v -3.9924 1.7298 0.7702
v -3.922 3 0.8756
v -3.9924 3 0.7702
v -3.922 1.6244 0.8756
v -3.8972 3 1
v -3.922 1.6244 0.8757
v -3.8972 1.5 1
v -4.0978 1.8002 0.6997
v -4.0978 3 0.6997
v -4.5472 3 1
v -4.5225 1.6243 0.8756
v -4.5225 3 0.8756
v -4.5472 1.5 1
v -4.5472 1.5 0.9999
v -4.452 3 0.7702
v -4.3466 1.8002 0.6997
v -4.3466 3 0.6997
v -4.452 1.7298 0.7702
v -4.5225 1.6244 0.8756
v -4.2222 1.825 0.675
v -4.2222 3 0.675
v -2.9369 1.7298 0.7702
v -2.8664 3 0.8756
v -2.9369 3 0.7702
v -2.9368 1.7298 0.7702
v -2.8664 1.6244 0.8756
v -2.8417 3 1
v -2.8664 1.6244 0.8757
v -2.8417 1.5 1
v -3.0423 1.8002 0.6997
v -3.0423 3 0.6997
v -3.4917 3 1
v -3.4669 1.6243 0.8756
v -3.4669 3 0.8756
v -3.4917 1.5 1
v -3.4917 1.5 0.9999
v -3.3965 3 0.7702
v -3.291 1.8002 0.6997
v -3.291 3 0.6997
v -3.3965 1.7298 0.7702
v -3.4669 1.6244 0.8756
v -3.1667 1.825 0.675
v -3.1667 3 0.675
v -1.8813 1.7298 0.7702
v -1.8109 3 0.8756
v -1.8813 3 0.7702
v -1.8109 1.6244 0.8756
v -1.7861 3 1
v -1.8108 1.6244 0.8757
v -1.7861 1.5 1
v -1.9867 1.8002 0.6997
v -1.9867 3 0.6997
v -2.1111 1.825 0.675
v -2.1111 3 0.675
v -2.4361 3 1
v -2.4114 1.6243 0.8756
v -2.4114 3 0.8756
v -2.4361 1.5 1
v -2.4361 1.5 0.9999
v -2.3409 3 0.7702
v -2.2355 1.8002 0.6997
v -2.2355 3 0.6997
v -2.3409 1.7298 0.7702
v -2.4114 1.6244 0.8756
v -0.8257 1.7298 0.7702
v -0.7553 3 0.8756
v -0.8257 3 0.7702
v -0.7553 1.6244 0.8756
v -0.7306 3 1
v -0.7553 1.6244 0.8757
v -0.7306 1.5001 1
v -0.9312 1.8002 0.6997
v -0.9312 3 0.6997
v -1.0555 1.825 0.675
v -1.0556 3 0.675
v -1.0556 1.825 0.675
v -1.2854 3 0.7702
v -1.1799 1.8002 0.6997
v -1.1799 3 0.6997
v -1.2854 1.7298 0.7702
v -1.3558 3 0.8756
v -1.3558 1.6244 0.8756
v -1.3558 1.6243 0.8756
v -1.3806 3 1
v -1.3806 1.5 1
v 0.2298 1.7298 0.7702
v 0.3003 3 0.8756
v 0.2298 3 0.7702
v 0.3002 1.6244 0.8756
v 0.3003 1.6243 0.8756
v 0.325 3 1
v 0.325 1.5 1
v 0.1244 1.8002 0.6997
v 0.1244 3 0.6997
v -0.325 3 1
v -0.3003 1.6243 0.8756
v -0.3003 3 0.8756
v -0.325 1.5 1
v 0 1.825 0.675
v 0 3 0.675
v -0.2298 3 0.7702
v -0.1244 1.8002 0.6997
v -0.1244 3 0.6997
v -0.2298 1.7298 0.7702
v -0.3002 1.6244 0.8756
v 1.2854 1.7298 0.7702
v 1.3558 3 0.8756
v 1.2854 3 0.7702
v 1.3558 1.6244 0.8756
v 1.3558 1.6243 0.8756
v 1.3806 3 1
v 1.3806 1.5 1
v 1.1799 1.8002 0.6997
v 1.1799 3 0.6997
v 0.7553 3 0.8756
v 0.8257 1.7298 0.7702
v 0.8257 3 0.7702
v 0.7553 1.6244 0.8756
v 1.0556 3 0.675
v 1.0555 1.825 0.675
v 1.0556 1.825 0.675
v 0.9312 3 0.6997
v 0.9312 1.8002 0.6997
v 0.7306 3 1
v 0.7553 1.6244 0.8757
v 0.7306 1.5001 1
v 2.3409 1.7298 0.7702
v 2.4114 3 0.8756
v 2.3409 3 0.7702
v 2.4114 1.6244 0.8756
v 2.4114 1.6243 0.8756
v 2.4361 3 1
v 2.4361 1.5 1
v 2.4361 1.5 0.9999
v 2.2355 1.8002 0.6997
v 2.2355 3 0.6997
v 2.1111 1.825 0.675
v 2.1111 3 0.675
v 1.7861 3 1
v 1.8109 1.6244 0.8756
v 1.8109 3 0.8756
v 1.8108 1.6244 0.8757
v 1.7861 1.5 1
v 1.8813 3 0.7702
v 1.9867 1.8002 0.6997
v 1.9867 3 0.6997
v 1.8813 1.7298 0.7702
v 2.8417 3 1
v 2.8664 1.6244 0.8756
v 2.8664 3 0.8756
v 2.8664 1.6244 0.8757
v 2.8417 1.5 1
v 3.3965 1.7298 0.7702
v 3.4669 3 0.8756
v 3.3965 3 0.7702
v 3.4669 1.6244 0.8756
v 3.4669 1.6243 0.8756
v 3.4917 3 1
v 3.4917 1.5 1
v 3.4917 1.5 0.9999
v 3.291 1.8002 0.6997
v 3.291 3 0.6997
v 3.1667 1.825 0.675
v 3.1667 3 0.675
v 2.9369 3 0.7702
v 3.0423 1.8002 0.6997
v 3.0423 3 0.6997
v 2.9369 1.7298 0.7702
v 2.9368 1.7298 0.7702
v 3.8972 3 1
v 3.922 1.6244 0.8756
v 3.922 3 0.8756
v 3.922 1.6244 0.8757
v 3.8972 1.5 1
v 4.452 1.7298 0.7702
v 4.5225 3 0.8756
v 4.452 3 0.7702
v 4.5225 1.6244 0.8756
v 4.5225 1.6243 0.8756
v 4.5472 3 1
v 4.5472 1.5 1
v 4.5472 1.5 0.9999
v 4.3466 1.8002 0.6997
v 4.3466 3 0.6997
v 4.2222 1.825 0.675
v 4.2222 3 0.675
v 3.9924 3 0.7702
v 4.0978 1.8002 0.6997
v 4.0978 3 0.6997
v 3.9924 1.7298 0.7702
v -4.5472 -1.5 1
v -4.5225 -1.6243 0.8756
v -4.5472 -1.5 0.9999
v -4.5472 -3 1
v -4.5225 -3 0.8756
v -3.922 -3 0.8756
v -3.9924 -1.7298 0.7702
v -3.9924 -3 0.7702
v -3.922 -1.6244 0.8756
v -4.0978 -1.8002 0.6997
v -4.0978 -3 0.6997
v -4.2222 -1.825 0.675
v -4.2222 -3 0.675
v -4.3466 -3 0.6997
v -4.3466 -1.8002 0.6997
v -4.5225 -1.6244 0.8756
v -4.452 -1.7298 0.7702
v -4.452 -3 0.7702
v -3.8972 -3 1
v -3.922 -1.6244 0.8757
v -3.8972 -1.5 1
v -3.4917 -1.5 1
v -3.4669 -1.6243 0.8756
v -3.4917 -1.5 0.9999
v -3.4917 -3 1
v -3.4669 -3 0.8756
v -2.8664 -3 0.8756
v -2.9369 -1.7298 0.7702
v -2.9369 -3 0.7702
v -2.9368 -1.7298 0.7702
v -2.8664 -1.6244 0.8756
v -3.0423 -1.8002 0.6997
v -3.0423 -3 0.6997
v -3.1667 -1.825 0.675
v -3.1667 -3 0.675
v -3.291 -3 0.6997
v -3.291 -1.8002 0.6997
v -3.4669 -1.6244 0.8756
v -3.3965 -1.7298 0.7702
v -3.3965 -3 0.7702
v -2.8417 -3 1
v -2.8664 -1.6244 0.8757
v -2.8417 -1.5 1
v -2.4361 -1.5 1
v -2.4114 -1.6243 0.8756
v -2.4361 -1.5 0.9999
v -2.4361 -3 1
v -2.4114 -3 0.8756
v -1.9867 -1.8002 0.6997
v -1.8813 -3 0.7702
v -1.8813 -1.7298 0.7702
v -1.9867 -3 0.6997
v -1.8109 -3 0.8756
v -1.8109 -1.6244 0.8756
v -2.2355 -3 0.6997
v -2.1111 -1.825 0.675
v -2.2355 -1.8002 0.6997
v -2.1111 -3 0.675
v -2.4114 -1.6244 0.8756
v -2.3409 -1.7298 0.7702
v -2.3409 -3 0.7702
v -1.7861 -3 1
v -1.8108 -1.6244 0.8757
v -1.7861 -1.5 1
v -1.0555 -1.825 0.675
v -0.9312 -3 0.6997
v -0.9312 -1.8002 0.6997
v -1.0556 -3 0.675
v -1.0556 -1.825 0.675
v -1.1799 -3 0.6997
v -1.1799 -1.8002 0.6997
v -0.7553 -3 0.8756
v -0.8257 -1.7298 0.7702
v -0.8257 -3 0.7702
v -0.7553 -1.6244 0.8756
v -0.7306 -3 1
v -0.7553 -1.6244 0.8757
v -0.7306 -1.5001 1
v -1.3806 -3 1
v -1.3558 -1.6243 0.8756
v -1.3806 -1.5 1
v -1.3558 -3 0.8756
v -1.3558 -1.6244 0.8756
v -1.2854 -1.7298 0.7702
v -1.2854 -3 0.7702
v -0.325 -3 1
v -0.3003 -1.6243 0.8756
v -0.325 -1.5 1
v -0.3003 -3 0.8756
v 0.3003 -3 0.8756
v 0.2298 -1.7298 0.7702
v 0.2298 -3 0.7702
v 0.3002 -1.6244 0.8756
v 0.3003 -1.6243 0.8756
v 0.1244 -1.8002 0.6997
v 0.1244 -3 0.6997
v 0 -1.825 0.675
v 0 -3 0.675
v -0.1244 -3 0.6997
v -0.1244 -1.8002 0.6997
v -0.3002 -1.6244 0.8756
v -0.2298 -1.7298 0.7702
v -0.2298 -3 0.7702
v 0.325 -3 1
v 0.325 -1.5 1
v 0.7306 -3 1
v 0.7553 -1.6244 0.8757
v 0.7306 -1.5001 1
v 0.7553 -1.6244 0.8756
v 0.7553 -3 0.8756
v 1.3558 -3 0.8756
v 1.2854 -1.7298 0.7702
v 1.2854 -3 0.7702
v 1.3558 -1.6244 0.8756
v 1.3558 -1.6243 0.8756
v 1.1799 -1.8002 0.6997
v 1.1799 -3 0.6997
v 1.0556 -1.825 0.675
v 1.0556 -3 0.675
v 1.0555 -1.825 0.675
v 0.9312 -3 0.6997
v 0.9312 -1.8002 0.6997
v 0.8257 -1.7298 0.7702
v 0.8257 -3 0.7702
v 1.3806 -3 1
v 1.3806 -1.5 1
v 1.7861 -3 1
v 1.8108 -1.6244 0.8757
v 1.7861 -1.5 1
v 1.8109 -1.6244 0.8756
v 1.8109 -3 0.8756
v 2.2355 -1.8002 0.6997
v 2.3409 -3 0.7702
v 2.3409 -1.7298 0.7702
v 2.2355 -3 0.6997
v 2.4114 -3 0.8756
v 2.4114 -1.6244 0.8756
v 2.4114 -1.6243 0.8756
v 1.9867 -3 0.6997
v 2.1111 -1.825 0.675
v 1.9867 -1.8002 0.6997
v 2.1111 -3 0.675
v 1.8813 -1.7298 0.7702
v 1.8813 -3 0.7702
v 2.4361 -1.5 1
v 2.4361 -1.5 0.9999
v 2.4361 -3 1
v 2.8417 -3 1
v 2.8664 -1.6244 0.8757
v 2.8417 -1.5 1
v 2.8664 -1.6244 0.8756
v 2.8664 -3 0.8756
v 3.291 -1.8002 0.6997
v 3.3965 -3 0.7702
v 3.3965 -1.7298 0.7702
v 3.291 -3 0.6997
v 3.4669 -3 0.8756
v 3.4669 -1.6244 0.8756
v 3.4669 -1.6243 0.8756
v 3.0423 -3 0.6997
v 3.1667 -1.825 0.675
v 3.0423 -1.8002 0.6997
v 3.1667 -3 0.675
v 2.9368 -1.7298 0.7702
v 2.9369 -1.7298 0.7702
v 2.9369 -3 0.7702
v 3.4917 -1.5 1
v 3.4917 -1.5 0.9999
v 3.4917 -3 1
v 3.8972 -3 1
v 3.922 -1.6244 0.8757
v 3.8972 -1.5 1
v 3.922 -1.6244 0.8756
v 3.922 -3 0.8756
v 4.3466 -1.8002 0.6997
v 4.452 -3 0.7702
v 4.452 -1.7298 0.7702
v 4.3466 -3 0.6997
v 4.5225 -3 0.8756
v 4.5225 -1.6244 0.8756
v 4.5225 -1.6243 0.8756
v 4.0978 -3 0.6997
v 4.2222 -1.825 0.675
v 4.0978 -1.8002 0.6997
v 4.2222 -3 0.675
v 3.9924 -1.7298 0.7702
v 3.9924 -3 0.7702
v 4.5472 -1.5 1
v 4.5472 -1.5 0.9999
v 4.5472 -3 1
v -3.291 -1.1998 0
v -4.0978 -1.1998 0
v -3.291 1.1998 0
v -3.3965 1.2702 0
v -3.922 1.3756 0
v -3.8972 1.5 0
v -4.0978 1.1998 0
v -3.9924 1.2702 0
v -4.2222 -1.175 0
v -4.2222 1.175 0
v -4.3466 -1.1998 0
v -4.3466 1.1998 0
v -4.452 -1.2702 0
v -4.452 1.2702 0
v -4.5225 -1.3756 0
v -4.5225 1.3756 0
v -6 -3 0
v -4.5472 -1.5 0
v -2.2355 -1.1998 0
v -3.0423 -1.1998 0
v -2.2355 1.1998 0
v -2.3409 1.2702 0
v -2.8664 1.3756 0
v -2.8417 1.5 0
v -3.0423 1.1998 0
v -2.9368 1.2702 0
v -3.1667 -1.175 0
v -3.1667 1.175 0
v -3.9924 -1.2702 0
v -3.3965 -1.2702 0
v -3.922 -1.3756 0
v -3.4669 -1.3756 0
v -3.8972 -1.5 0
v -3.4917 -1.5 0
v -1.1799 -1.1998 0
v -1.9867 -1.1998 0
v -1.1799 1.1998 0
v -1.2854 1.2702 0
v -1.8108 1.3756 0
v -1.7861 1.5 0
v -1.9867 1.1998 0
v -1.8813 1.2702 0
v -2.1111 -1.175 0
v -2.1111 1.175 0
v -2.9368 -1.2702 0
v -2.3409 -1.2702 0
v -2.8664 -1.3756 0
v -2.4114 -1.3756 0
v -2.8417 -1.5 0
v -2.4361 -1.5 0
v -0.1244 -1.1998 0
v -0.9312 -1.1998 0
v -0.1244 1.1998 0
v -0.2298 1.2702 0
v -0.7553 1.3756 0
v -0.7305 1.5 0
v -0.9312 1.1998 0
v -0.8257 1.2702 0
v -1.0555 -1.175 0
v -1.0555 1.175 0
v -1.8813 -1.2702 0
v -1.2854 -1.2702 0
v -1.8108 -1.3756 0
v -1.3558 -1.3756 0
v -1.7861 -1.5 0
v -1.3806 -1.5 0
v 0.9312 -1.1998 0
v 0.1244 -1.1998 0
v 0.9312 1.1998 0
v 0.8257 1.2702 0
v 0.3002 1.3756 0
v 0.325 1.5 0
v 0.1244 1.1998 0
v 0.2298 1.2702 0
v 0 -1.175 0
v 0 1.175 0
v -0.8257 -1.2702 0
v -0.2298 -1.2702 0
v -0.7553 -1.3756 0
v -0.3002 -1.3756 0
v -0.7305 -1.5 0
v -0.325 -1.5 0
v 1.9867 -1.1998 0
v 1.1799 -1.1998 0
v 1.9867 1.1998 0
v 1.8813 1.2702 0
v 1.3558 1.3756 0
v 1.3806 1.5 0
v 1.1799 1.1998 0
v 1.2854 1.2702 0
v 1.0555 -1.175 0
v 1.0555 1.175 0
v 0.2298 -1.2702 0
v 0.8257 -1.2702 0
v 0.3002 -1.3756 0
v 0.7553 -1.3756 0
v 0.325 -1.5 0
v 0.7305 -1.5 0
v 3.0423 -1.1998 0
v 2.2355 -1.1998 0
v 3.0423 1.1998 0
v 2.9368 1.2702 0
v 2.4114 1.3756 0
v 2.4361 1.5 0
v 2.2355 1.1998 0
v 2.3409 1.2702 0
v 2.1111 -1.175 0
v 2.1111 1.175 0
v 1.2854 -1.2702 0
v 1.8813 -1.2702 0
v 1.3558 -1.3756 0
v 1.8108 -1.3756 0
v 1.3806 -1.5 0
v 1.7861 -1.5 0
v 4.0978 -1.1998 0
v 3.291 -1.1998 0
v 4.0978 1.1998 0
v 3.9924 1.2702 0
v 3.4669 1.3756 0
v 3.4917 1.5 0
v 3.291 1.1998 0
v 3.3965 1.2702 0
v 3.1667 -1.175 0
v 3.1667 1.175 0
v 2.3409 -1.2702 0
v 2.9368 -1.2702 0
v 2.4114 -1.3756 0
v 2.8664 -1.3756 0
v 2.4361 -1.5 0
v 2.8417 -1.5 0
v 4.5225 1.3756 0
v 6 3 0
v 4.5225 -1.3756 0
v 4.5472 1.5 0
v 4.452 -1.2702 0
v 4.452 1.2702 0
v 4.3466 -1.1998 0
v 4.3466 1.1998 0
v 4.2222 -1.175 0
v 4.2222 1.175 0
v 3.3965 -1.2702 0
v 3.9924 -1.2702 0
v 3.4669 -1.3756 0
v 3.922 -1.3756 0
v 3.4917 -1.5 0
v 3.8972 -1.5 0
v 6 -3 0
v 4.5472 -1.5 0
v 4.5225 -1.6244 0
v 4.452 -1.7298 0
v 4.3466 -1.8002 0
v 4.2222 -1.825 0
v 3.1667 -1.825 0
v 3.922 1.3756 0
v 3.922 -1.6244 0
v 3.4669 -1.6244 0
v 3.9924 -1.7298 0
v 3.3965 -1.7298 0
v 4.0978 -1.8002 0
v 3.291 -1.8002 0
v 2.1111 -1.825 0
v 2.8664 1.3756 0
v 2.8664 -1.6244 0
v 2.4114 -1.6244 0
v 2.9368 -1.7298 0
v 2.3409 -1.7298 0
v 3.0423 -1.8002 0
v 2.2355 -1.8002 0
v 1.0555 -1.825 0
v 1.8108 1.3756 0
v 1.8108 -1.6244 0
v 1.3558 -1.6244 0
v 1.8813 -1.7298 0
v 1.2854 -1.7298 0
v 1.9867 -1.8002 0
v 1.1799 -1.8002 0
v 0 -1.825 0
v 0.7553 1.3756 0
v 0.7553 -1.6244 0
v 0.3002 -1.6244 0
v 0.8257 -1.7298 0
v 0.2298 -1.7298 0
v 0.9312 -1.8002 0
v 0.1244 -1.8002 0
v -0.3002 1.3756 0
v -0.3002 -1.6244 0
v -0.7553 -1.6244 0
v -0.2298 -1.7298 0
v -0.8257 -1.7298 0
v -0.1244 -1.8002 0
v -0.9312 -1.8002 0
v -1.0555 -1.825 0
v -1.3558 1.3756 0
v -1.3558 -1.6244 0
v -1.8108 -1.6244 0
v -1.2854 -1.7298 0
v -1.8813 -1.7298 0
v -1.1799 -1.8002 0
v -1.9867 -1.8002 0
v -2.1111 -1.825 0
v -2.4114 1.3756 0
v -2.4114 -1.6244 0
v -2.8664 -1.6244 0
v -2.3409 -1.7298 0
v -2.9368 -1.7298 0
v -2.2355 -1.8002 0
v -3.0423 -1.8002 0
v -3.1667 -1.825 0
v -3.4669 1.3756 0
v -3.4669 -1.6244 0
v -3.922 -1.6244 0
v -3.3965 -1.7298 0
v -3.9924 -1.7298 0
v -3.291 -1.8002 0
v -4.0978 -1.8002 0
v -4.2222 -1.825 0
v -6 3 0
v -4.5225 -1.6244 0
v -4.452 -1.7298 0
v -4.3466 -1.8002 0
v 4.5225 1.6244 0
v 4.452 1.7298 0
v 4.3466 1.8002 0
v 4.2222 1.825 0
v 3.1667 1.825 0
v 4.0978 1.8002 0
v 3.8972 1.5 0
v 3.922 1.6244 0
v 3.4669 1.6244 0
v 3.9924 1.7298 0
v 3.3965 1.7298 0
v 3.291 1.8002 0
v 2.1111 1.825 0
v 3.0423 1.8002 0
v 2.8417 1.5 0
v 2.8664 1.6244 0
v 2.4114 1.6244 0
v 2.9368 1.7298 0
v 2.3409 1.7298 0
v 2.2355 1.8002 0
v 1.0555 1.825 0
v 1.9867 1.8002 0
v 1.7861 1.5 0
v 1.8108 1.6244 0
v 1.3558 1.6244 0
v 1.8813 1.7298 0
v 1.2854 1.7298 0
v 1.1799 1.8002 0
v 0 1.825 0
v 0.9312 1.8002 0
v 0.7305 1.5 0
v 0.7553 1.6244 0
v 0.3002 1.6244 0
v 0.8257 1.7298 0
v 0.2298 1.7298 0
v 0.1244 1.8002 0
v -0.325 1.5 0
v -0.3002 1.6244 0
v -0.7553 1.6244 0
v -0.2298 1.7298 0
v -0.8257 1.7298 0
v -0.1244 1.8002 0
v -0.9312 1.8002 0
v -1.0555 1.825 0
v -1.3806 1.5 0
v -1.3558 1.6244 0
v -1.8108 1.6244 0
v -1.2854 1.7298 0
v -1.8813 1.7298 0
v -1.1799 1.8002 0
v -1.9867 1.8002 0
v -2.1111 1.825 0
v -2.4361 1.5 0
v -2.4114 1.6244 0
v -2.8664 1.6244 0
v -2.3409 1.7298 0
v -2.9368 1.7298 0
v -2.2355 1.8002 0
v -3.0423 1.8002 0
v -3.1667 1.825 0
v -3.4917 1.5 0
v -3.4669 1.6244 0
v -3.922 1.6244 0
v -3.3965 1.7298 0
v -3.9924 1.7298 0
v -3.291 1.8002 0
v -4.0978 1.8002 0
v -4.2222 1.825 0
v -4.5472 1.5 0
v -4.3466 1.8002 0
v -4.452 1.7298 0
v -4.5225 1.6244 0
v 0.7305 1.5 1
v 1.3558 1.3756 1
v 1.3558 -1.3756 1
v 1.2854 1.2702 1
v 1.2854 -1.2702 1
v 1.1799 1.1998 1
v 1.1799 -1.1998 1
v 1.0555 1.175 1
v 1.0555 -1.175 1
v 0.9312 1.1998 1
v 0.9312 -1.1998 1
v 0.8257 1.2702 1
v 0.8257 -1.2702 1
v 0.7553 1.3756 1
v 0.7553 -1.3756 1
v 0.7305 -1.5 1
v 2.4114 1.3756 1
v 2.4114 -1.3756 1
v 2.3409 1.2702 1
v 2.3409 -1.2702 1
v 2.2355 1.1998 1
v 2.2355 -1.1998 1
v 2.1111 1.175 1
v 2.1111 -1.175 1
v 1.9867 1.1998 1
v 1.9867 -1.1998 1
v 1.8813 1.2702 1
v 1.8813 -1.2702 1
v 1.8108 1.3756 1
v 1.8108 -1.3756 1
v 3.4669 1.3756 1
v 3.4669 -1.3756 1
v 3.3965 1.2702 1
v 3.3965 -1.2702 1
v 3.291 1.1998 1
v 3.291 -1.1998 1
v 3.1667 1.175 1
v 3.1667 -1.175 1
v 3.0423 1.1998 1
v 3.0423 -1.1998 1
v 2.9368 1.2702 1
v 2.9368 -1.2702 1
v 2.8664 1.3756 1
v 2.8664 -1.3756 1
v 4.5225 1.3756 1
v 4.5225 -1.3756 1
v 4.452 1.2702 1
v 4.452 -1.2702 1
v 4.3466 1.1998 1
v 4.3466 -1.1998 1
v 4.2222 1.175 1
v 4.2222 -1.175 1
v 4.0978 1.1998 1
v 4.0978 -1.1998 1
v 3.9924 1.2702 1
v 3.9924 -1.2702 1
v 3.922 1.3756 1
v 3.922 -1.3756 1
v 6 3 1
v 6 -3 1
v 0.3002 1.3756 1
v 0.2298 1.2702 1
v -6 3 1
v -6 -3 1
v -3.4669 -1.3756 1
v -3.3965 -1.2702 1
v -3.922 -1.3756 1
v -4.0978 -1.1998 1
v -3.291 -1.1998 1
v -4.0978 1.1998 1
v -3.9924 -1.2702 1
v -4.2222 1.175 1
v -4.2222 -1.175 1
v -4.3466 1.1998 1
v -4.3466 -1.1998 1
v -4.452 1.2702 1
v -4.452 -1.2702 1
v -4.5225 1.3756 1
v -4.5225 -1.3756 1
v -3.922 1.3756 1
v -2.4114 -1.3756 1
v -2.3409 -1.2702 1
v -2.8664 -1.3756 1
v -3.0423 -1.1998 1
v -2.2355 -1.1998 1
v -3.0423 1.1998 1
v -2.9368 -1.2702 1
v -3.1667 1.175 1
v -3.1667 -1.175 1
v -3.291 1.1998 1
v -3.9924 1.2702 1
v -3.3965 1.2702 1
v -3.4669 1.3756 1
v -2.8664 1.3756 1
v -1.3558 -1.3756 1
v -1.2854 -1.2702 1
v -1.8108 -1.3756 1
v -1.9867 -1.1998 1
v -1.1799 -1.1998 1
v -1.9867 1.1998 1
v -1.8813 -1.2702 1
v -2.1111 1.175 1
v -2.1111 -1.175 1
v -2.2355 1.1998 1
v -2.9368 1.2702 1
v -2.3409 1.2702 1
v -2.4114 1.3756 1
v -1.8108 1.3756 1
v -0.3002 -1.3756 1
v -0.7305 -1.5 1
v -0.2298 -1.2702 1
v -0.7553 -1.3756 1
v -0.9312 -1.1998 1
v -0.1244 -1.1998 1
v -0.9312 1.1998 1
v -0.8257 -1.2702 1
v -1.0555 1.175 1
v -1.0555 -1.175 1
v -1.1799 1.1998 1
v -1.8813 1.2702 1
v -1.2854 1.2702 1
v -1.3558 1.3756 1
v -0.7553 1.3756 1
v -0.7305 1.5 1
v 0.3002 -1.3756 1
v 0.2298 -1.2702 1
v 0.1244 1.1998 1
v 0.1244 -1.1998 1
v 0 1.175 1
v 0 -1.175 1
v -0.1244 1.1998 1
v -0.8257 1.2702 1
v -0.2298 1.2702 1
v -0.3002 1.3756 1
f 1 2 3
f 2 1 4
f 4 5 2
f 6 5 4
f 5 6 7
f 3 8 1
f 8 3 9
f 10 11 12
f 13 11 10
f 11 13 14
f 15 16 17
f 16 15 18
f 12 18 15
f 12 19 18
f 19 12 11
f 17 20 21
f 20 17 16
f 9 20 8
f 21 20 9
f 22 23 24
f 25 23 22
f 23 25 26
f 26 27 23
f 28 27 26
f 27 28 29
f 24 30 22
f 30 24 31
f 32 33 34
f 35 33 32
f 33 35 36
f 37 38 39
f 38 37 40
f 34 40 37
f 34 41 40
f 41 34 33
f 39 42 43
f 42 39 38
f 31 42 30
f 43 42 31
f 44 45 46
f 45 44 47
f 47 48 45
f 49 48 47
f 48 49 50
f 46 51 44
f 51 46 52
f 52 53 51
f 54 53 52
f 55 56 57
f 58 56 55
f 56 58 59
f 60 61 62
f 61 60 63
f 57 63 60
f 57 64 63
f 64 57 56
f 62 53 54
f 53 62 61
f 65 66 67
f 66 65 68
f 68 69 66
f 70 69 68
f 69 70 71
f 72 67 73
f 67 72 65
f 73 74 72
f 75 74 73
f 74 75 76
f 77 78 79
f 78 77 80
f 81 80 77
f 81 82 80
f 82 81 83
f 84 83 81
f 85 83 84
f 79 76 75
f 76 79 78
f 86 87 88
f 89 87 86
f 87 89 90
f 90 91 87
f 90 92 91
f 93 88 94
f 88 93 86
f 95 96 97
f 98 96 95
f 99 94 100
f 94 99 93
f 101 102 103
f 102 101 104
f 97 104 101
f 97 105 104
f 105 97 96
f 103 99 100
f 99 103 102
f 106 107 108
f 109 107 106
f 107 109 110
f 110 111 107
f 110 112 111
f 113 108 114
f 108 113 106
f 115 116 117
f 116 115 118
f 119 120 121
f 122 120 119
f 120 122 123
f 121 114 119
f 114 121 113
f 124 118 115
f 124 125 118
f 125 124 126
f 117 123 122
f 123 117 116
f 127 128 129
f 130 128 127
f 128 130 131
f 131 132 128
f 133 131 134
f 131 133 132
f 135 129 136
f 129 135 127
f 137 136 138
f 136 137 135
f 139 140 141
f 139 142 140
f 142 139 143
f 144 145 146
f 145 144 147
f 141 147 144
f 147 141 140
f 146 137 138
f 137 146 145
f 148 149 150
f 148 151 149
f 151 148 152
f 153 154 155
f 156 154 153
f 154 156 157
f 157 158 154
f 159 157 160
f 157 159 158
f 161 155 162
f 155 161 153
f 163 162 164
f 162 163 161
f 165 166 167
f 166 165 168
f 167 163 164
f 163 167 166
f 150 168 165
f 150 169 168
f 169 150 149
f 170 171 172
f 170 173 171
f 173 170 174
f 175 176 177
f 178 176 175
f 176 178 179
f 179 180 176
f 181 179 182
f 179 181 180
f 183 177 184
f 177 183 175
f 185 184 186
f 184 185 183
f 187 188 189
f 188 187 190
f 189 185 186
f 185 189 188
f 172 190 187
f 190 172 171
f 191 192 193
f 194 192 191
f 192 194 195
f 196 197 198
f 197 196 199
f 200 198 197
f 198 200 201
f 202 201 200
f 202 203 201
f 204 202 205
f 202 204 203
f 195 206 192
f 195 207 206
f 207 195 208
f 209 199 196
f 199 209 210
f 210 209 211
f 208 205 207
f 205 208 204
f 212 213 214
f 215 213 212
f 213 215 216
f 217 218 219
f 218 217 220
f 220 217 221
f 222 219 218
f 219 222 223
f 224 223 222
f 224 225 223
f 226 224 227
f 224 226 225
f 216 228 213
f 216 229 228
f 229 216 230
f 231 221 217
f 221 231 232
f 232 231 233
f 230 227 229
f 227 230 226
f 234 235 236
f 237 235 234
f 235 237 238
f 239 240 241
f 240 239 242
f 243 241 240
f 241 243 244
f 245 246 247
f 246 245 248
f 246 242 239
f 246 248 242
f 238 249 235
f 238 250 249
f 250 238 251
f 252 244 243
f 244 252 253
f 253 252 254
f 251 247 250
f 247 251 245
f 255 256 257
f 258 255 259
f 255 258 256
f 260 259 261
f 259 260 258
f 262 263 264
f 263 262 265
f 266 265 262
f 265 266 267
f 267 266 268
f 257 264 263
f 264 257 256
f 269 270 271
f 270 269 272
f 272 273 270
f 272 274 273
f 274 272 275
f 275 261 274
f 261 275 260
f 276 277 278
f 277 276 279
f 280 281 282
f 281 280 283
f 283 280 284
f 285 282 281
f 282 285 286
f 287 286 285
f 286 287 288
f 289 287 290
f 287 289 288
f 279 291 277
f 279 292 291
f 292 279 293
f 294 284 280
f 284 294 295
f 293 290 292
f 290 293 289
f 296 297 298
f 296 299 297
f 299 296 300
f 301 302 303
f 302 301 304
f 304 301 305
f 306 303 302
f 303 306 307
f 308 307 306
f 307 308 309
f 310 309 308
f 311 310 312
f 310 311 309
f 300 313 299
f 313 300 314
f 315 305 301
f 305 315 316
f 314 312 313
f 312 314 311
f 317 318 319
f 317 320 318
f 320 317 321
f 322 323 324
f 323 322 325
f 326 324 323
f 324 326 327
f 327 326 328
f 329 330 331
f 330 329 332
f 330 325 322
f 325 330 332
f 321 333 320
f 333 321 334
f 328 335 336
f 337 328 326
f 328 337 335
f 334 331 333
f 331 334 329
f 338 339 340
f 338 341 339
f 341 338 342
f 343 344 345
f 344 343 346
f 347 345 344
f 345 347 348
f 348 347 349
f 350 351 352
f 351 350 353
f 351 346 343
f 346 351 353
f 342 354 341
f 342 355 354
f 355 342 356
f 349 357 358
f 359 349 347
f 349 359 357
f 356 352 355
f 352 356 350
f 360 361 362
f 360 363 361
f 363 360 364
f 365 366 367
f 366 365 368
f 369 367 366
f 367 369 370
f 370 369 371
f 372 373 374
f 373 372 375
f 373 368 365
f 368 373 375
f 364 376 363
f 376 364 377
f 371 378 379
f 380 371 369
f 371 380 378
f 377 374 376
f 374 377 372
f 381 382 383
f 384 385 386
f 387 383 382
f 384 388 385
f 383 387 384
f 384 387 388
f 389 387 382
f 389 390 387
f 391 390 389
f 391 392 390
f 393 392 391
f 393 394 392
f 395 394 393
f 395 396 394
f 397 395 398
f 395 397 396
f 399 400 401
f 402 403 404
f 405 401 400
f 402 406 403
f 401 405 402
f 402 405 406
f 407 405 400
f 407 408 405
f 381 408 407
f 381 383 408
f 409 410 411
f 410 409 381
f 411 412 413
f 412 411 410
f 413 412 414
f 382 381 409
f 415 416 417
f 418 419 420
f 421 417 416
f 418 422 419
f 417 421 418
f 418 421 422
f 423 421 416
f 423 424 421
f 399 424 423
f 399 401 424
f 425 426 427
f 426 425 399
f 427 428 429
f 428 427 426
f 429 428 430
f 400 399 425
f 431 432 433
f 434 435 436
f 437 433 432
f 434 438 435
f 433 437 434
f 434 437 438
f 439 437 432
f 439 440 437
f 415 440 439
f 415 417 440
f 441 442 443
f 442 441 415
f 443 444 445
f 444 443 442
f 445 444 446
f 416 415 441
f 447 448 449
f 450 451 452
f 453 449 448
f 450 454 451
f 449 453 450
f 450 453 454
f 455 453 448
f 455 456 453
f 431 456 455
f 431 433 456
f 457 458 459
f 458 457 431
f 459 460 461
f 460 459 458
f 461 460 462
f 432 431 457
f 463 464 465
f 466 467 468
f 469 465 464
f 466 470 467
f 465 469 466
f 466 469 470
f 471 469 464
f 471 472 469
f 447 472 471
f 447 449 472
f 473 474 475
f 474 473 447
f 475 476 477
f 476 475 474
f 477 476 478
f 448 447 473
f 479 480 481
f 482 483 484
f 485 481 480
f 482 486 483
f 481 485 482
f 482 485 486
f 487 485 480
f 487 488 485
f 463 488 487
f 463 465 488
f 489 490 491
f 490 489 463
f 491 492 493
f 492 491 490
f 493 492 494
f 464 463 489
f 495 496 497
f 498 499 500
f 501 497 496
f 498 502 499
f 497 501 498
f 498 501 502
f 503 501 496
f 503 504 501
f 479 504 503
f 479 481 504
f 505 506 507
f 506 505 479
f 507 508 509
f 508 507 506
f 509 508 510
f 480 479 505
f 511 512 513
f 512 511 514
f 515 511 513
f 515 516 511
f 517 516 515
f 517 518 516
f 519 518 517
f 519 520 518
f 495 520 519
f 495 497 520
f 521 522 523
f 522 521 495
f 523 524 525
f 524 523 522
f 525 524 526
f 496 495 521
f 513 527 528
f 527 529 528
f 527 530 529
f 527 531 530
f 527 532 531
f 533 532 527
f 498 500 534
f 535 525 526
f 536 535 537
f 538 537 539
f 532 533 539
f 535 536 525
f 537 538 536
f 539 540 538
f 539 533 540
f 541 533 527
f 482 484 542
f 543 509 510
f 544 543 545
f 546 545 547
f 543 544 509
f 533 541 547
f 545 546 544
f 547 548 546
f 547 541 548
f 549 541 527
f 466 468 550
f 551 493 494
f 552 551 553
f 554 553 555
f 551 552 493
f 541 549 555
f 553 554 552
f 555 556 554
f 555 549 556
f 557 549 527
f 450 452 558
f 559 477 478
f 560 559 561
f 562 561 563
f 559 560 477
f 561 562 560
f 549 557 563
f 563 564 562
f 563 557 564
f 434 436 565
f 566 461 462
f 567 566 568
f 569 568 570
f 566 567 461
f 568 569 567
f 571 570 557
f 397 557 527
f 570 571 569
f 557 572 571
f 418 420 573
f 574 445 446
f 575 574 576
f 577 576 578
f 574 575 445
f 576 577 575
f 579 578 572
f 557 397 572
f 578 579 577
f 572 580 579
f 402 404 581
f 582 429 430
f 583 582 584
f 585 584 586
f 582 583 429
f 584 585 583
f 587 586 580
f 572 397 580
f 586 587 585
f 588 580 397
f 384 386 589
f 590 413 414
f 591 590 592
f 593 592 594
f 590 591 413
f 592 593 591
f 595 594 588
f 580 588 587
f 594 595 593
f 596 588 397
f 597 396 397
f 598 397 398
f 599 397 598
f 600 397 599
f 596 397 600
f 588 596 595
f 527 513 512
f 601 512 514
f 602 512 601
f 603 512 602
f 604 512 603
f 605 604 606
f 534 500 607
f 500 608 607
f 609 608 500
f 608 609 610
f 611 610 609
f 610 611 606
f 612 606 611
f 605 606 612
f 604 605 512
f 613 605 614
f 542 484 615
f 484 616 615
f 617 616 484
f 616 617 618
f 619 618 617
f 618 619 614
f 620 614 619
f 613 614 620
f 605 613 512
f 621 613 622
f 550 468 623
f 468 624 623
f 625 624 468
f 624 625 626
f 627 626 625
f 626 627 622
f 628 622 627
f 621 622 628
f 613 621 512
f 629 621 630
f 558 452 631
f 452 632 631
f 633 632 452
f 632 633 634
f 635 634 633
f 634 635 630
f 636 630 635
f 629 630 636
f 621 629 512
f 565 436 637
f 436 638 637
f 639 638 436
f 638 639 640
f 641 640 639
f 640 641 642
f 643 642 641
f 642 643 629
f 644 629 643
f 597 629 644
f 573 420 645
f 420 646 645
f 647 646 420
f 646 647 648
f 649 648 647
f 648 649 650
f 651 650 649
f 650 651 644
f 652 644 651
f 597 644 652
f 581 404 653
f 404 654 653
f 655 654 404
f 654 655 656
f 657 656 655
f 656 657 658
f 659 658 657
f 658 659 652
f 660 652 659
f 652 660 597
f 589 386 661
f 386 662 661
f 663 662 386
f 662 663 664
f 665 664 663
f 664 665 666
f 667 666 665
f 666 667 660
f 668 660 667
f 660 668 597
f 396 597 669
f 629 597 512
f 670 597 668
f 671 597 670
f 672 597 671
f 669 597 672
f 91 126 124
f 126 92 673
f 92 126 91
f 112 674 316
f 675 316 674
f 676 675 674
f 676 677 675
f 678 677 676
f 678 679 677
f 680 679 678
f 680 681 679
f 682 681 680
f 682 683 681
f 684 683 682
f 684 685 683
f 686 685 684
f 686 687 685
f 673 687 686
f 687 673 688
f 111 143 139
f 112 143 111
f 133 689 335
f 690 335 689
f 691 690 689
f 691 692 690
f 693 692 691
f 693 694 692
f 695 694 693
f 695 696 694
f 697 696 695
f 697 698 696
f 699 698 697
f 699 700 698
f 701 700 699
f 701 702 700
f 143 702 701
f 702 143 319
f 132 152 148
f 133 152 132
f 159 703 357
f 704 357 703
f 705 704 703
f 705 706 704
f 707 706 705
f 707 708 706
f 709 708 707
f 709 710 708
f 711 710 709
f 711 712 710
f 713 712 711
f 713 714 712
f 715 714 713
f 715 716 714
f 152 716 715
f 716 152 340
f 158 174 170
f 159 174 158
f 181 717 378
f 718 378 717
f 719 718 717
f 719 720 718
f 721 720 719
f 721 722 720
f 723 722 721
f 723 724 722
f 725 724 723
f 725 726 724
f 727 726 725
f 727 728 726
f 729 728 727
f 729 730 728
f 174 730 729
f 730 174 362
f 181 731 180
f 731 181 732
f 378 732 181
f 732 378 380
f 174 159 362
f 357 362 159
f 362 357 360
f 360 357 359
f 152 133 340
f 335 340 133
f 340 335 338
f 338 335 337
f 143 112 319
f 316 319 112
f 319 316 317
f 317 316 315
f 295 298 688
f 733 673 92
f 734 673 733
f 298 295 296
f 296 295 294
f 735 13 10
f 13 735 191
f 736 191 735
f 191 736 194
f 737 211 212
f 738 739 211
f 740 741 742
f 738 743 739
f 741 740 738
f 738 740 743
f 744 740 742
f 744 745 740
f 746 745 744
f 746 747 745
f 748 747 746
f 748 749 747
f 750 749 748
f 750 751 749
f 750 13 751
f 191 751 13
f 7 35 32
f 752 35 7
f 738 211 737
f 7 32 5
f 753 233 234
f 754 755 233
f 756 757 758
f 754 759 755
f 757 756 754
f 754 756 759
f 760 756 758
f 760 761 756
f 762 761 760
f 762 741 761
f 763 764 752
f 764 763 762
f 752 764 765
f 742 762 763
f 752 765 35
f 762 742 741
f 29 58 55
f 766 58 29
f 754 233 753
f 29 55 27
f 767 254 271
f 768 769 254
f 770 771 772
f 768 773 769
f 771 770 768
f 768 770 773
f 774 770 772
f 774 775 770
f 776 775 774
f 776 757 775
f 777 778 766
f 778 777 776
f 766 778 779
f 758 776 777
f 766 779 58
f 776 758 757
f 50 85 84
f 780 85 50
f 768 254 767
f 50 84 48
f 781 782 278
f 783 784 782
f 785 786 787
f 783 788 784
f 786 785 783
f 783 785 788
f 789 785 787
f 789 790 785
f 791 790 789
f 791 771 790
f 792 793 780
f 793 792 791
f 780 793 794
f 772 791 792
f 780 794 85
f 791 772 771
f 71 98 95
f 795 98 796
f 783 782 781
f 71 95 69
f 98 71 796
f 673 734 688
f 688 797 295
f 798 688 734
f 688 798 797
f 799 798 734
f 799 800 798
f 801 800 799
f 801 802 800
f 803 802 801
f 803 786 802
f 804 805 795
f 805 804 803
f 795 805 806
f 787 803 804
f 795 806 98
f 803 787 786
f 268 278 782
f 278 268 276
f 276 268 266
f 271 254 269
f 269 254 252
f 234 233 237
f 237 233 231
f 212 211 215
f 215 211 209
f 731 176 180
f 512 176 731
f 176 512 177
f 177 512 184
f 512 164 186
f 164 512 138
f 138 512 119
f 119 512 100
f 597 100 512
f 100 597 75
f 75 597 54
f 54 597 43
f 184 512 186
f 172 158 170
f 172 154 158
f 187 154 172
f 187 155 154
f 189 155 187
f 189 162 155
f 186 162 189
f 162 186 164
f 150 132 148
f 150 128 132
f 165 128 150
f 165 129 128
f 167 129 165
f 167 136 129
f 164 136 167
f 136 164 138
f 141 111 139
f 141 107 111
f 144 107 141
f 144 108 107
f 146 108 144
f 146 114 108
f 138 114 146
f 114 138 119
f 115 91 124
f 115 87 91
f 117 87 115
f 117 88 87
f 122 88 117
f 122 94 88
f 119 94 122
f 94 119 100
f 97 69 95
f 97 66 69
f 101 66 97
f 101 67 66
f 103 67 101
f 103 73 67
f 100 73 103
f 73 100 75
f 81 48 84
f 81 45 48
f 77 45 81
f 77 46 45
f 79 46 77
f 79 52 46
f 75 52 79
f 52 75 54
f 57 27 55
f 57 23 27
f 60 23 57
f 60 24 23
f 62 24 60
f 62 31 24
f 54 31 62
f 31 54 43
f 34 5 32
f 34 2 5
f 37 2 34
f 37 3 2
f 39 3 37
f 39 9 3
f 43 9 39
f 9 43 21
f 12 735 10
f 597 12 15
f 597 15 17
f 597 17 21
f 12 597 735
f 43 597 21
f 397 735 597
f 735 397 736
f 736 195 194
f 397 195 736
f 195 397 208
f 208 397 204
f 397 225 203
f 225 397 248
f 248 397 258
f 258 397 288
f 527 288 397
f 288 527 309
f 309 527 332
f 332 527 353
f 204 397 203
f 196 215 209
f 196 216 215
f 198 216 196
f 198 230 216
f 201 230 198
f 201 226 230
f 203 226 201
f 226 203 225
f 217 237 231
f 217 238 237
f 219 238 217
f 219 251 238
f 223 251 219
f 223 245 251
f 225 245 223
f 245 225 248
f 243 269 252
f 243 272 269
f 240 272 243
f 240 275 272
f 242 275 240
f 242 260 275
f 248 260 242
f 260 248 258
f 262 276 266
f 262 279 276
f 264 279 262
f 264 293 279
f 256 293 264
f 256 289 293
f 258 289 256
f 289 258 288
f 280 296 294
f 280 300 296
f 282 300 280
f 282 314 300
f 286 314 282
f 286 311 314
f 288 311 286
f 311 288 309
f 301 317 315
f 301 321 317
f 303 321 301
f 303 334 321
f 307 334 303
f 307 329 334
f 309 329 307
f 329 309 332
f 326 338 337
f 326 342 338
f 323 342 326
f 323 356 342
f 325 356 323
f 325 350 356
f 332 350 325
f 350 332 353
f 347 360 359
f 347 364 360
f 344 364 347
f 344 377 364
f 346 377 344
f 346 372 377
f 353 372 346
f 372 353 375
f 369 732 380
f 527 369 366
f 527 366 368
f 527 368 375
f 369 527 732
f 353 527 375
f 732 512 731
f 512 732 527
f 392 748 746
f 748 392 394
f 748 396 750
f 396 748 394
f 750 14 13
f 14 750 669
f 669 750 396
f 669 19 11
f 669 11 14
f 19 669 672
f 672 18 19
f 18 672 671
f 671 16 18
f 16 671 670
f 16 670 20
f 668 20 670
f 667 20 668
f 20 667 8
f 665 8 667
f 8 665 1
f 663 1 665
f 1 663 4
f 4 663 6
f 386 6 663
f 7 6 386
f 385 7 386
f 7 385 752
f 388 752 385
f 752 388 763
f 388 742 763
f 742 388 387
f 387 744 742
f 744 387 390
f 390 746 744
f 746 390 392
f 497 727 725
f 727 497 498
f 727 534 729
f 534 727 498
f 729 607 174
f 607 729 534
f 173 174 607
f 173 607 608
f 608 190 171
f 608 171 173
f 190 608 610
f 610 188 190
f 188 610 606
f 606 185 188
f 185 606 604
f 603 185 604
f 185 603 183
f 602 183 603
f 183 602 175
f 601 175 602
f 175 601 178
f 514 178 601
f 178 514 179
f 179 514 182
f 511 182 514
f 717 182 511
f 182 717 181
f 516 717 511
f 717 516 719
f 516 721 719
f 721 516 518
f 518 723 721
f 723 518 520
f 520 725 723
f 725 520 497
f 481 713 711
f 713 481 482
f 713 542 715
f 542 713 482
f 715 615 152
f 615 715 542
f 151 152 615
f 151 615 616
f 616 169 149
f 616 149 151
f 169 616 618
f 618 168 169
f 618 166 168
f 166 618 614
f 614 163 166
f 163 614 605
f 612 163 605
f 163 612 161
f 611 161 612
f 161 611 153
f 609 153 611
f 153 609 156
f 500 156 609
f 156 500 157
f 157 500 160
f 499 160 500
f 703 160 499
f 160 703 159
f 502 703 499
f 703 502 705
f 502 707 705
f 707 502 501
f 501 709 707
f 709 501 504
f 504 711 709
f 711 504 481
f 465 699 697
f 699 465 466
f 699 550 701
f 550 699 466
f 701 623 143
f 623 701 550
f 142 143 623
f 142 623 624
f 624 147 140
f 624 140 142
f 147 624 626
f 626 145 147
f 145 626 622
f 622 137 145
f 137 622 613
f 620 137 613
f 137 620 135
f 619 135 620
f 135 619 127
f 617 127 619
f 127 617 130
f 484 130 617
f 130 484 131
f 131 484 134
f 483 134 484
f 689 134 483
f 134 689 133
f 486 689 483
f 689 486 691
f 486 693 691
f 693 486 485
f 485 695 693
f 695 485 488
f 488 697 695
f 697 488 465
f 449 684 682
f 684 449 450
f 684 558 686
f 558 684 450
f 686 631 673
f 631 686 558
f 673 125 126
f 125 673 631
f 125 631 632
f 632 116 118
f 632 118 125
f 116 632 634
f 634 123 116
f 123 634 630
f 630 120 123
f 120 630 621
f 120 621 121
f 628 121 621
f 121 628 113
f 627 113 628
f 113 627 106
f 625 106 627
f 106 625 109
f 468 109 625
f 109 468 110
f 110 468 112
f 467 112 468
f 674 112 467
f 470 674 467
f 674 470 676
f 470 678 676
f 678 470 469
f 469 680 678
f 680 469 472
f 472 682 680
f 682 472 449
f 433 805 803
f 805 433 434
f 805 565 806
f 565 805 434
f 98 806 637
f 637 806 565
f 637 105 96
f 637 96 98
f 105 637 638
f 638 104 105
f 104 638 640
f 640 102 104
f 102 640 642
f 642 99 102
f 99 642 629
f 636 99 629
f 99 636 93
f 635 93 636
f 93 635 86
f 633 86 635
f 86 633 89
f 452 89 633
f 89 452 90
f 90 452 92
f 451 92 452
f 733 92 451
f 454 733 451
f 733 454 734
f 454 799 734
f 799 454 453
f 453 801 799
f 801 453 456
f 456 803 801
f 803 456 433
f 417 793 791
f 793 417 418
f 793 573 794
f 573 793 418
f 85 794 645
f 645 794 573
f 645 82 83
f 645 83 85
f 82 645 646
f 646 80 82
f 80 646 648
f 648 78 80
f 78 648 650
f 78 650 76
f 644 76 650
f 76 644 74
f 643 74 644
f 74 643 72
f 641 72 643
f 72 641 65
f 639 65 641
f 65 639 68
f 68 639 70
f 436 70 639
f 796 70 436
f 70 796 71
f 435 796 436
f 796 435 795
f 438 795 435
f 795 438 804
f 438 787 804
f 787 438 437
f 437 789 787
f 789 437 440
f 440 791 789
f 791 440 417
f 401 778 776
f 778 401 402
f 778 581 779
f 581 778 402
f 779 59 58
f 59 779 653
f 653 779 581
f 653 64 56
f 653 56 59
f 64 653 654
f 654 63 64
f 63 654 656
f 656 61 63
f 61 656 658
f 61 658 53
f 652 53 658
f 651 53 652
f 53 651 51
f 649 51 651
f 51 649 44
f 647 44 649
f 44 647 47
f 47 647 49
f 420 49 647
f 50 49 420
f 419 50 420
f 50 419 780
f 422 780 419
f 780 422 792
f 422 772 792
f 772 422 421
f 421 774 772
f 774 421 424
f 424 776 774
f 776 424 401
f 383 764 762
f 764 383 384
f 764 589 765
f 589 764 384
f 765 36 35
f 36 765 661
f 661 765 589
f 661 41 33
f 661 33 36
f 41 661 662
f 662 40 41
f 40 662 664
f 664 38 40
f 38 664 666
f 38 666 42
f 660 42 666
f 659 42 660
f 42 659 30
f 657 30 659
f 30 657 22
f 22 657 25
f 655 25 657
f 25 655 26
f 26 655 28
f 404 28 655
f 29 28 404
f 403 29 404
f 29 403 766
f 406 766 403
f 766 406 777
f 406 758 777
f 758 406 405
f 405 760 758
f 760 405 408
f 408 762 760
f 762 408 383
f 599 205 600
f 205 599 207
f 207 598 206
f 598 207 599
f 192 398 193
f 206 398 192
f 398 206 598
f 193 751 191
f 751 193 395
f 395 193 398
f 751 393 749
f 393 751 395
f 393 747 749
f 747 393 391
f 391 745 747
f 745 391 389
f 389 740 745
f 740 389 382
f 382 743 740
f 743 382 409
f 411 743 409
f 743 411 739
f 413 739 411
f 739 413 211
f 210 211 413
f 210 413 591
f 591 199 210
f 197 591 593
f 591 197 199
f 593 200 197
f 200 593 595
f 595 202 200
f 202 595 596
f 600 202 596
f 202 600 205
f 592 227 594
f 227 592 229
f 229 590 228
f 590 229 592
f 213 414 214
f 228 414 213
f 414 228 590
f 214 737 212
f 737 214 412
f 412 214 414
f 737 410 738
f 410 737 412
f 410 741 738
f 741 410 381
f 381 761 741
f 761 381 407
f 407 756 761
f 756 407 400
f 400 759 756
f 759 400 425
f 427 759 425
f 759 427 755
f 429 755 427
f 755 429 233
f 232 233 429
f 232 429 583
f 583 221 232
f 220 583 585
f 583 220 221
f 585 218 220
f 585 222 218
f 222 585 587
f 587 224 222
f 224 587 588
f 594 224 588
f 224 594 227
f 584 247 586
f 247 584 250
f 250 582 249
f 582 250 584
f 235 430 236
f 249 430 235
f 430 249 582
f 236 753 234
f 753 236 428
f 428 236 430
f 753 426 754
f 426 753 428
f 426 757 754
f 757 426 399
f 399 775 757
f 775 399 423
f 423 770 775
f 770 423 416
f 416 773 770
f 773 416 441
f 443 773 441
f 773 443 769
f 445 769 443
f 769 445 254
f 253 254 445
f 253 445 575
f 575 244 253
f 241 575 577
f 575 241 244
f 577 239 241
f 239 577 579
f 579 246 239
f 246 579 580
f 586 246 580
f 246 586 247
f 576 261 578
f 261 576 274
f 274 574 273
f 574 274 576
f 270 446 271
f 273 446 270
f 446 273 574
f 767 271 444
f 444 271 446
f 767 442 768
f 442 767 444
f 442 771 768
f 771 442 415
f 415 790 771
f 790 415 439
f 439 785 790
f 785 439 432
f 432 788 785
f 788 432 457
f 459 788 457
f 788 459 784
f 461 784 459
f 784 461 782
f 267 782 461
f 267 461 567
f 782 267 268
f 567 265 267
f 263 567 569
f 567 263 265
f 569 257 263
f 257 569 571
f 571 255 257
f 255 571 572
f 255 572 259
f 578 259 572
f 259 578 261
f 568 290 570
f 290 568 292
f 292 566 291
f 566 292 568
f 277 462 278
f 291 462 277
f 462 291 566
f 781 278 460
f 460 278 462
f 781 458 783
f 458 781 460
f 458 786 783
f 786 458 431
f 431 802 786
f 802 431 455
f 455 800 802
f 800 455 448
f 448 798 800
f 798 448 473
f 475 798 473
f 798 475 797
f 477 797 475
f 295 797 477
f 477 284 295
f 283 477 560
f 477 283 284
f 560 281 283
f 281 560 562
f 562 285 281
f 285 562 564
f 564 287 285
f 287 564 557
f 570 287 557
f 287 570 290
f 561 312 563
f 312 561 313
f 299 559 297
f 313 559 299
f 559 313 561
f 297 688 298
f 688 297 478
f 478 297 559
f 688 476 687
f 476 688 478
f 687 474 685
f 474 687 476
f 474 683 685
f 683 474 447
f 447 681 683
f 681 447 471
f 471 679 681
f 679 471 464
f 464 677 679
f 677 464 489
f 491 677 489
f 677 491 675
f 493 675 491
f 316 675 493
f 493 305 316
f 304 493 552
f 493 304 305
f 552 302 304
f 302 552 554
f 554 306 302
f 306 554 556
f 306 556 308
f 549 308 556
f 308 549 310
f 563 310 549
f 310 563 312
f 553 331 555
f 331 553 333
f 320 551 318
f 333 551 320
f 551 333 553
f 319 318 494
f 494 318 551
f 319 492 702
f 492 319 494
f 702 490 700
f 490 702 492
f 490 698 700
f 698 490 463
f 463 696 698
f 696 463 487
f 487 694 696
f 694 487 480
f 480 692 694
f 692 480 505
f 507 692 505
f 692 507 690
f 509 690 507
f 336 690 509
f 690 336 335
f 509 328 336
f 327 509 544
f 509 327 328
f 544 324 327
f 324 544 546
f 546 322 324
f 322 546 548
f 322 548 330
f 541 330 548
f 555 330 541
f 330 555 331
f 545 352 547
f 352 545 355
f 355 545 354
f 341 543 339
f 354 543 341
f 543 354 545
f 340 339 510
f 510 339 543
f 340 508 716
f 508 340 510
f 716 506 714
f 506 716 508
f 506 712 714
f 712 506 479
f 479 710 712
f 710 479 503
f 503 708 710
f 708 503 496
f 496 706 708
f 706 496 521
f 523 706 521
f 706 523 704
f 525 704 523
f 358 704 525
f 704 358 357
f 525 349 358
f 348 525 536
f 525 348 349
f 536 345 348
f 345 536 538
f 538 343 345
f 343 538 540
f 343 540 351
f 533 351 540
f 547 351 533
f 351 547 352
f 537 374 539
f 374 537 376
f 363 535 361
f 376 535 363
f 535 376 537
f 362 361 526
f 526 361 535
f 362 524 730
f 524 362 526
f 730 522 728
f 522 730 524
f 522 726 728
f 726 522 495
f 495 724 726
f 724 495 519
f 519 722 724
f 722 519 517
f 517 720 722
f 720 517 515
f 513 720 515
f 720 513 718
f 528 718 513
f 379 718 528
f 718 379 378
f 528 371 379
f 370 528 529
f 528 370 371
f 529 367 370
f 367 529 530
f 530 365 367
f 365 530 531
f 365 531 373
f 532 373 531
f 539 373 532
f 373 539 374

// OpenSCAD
width = 12;
height = 6;
thickness = 1;
connectorWidth = 9.5;
connectorLength = 3;
numPins = 9;
holeSize = 0.65;

$fn = 16;

module pins() {
    x0 = -connectorWidth/2;
    dx = connectorWidth / numPins;
    for (i=[0:numPins-1])
        translate([x0+dx*i+0.5*dx,0]) children();
}

difference() {
    linear_extrude(height=thickness)
    difference() {
        square([width,height],center=true);
        translate([0,connectorLength/2]) pins() circle(d=holeSize);
        translate([0,-connectorLength/2]) pins() circle(d=holeSize);
    };
    translate([0,connectorLength/2]) pins() translate([0,0,thickness]) rotate([-90,0,0]) cylinder(d=holeSize,h=height);
    translate([0,-connectorLength/2]) pins() translate([0,0,thickness]) rotate([90,0,0]) cylinder(d=holeSize,h=height);
}
